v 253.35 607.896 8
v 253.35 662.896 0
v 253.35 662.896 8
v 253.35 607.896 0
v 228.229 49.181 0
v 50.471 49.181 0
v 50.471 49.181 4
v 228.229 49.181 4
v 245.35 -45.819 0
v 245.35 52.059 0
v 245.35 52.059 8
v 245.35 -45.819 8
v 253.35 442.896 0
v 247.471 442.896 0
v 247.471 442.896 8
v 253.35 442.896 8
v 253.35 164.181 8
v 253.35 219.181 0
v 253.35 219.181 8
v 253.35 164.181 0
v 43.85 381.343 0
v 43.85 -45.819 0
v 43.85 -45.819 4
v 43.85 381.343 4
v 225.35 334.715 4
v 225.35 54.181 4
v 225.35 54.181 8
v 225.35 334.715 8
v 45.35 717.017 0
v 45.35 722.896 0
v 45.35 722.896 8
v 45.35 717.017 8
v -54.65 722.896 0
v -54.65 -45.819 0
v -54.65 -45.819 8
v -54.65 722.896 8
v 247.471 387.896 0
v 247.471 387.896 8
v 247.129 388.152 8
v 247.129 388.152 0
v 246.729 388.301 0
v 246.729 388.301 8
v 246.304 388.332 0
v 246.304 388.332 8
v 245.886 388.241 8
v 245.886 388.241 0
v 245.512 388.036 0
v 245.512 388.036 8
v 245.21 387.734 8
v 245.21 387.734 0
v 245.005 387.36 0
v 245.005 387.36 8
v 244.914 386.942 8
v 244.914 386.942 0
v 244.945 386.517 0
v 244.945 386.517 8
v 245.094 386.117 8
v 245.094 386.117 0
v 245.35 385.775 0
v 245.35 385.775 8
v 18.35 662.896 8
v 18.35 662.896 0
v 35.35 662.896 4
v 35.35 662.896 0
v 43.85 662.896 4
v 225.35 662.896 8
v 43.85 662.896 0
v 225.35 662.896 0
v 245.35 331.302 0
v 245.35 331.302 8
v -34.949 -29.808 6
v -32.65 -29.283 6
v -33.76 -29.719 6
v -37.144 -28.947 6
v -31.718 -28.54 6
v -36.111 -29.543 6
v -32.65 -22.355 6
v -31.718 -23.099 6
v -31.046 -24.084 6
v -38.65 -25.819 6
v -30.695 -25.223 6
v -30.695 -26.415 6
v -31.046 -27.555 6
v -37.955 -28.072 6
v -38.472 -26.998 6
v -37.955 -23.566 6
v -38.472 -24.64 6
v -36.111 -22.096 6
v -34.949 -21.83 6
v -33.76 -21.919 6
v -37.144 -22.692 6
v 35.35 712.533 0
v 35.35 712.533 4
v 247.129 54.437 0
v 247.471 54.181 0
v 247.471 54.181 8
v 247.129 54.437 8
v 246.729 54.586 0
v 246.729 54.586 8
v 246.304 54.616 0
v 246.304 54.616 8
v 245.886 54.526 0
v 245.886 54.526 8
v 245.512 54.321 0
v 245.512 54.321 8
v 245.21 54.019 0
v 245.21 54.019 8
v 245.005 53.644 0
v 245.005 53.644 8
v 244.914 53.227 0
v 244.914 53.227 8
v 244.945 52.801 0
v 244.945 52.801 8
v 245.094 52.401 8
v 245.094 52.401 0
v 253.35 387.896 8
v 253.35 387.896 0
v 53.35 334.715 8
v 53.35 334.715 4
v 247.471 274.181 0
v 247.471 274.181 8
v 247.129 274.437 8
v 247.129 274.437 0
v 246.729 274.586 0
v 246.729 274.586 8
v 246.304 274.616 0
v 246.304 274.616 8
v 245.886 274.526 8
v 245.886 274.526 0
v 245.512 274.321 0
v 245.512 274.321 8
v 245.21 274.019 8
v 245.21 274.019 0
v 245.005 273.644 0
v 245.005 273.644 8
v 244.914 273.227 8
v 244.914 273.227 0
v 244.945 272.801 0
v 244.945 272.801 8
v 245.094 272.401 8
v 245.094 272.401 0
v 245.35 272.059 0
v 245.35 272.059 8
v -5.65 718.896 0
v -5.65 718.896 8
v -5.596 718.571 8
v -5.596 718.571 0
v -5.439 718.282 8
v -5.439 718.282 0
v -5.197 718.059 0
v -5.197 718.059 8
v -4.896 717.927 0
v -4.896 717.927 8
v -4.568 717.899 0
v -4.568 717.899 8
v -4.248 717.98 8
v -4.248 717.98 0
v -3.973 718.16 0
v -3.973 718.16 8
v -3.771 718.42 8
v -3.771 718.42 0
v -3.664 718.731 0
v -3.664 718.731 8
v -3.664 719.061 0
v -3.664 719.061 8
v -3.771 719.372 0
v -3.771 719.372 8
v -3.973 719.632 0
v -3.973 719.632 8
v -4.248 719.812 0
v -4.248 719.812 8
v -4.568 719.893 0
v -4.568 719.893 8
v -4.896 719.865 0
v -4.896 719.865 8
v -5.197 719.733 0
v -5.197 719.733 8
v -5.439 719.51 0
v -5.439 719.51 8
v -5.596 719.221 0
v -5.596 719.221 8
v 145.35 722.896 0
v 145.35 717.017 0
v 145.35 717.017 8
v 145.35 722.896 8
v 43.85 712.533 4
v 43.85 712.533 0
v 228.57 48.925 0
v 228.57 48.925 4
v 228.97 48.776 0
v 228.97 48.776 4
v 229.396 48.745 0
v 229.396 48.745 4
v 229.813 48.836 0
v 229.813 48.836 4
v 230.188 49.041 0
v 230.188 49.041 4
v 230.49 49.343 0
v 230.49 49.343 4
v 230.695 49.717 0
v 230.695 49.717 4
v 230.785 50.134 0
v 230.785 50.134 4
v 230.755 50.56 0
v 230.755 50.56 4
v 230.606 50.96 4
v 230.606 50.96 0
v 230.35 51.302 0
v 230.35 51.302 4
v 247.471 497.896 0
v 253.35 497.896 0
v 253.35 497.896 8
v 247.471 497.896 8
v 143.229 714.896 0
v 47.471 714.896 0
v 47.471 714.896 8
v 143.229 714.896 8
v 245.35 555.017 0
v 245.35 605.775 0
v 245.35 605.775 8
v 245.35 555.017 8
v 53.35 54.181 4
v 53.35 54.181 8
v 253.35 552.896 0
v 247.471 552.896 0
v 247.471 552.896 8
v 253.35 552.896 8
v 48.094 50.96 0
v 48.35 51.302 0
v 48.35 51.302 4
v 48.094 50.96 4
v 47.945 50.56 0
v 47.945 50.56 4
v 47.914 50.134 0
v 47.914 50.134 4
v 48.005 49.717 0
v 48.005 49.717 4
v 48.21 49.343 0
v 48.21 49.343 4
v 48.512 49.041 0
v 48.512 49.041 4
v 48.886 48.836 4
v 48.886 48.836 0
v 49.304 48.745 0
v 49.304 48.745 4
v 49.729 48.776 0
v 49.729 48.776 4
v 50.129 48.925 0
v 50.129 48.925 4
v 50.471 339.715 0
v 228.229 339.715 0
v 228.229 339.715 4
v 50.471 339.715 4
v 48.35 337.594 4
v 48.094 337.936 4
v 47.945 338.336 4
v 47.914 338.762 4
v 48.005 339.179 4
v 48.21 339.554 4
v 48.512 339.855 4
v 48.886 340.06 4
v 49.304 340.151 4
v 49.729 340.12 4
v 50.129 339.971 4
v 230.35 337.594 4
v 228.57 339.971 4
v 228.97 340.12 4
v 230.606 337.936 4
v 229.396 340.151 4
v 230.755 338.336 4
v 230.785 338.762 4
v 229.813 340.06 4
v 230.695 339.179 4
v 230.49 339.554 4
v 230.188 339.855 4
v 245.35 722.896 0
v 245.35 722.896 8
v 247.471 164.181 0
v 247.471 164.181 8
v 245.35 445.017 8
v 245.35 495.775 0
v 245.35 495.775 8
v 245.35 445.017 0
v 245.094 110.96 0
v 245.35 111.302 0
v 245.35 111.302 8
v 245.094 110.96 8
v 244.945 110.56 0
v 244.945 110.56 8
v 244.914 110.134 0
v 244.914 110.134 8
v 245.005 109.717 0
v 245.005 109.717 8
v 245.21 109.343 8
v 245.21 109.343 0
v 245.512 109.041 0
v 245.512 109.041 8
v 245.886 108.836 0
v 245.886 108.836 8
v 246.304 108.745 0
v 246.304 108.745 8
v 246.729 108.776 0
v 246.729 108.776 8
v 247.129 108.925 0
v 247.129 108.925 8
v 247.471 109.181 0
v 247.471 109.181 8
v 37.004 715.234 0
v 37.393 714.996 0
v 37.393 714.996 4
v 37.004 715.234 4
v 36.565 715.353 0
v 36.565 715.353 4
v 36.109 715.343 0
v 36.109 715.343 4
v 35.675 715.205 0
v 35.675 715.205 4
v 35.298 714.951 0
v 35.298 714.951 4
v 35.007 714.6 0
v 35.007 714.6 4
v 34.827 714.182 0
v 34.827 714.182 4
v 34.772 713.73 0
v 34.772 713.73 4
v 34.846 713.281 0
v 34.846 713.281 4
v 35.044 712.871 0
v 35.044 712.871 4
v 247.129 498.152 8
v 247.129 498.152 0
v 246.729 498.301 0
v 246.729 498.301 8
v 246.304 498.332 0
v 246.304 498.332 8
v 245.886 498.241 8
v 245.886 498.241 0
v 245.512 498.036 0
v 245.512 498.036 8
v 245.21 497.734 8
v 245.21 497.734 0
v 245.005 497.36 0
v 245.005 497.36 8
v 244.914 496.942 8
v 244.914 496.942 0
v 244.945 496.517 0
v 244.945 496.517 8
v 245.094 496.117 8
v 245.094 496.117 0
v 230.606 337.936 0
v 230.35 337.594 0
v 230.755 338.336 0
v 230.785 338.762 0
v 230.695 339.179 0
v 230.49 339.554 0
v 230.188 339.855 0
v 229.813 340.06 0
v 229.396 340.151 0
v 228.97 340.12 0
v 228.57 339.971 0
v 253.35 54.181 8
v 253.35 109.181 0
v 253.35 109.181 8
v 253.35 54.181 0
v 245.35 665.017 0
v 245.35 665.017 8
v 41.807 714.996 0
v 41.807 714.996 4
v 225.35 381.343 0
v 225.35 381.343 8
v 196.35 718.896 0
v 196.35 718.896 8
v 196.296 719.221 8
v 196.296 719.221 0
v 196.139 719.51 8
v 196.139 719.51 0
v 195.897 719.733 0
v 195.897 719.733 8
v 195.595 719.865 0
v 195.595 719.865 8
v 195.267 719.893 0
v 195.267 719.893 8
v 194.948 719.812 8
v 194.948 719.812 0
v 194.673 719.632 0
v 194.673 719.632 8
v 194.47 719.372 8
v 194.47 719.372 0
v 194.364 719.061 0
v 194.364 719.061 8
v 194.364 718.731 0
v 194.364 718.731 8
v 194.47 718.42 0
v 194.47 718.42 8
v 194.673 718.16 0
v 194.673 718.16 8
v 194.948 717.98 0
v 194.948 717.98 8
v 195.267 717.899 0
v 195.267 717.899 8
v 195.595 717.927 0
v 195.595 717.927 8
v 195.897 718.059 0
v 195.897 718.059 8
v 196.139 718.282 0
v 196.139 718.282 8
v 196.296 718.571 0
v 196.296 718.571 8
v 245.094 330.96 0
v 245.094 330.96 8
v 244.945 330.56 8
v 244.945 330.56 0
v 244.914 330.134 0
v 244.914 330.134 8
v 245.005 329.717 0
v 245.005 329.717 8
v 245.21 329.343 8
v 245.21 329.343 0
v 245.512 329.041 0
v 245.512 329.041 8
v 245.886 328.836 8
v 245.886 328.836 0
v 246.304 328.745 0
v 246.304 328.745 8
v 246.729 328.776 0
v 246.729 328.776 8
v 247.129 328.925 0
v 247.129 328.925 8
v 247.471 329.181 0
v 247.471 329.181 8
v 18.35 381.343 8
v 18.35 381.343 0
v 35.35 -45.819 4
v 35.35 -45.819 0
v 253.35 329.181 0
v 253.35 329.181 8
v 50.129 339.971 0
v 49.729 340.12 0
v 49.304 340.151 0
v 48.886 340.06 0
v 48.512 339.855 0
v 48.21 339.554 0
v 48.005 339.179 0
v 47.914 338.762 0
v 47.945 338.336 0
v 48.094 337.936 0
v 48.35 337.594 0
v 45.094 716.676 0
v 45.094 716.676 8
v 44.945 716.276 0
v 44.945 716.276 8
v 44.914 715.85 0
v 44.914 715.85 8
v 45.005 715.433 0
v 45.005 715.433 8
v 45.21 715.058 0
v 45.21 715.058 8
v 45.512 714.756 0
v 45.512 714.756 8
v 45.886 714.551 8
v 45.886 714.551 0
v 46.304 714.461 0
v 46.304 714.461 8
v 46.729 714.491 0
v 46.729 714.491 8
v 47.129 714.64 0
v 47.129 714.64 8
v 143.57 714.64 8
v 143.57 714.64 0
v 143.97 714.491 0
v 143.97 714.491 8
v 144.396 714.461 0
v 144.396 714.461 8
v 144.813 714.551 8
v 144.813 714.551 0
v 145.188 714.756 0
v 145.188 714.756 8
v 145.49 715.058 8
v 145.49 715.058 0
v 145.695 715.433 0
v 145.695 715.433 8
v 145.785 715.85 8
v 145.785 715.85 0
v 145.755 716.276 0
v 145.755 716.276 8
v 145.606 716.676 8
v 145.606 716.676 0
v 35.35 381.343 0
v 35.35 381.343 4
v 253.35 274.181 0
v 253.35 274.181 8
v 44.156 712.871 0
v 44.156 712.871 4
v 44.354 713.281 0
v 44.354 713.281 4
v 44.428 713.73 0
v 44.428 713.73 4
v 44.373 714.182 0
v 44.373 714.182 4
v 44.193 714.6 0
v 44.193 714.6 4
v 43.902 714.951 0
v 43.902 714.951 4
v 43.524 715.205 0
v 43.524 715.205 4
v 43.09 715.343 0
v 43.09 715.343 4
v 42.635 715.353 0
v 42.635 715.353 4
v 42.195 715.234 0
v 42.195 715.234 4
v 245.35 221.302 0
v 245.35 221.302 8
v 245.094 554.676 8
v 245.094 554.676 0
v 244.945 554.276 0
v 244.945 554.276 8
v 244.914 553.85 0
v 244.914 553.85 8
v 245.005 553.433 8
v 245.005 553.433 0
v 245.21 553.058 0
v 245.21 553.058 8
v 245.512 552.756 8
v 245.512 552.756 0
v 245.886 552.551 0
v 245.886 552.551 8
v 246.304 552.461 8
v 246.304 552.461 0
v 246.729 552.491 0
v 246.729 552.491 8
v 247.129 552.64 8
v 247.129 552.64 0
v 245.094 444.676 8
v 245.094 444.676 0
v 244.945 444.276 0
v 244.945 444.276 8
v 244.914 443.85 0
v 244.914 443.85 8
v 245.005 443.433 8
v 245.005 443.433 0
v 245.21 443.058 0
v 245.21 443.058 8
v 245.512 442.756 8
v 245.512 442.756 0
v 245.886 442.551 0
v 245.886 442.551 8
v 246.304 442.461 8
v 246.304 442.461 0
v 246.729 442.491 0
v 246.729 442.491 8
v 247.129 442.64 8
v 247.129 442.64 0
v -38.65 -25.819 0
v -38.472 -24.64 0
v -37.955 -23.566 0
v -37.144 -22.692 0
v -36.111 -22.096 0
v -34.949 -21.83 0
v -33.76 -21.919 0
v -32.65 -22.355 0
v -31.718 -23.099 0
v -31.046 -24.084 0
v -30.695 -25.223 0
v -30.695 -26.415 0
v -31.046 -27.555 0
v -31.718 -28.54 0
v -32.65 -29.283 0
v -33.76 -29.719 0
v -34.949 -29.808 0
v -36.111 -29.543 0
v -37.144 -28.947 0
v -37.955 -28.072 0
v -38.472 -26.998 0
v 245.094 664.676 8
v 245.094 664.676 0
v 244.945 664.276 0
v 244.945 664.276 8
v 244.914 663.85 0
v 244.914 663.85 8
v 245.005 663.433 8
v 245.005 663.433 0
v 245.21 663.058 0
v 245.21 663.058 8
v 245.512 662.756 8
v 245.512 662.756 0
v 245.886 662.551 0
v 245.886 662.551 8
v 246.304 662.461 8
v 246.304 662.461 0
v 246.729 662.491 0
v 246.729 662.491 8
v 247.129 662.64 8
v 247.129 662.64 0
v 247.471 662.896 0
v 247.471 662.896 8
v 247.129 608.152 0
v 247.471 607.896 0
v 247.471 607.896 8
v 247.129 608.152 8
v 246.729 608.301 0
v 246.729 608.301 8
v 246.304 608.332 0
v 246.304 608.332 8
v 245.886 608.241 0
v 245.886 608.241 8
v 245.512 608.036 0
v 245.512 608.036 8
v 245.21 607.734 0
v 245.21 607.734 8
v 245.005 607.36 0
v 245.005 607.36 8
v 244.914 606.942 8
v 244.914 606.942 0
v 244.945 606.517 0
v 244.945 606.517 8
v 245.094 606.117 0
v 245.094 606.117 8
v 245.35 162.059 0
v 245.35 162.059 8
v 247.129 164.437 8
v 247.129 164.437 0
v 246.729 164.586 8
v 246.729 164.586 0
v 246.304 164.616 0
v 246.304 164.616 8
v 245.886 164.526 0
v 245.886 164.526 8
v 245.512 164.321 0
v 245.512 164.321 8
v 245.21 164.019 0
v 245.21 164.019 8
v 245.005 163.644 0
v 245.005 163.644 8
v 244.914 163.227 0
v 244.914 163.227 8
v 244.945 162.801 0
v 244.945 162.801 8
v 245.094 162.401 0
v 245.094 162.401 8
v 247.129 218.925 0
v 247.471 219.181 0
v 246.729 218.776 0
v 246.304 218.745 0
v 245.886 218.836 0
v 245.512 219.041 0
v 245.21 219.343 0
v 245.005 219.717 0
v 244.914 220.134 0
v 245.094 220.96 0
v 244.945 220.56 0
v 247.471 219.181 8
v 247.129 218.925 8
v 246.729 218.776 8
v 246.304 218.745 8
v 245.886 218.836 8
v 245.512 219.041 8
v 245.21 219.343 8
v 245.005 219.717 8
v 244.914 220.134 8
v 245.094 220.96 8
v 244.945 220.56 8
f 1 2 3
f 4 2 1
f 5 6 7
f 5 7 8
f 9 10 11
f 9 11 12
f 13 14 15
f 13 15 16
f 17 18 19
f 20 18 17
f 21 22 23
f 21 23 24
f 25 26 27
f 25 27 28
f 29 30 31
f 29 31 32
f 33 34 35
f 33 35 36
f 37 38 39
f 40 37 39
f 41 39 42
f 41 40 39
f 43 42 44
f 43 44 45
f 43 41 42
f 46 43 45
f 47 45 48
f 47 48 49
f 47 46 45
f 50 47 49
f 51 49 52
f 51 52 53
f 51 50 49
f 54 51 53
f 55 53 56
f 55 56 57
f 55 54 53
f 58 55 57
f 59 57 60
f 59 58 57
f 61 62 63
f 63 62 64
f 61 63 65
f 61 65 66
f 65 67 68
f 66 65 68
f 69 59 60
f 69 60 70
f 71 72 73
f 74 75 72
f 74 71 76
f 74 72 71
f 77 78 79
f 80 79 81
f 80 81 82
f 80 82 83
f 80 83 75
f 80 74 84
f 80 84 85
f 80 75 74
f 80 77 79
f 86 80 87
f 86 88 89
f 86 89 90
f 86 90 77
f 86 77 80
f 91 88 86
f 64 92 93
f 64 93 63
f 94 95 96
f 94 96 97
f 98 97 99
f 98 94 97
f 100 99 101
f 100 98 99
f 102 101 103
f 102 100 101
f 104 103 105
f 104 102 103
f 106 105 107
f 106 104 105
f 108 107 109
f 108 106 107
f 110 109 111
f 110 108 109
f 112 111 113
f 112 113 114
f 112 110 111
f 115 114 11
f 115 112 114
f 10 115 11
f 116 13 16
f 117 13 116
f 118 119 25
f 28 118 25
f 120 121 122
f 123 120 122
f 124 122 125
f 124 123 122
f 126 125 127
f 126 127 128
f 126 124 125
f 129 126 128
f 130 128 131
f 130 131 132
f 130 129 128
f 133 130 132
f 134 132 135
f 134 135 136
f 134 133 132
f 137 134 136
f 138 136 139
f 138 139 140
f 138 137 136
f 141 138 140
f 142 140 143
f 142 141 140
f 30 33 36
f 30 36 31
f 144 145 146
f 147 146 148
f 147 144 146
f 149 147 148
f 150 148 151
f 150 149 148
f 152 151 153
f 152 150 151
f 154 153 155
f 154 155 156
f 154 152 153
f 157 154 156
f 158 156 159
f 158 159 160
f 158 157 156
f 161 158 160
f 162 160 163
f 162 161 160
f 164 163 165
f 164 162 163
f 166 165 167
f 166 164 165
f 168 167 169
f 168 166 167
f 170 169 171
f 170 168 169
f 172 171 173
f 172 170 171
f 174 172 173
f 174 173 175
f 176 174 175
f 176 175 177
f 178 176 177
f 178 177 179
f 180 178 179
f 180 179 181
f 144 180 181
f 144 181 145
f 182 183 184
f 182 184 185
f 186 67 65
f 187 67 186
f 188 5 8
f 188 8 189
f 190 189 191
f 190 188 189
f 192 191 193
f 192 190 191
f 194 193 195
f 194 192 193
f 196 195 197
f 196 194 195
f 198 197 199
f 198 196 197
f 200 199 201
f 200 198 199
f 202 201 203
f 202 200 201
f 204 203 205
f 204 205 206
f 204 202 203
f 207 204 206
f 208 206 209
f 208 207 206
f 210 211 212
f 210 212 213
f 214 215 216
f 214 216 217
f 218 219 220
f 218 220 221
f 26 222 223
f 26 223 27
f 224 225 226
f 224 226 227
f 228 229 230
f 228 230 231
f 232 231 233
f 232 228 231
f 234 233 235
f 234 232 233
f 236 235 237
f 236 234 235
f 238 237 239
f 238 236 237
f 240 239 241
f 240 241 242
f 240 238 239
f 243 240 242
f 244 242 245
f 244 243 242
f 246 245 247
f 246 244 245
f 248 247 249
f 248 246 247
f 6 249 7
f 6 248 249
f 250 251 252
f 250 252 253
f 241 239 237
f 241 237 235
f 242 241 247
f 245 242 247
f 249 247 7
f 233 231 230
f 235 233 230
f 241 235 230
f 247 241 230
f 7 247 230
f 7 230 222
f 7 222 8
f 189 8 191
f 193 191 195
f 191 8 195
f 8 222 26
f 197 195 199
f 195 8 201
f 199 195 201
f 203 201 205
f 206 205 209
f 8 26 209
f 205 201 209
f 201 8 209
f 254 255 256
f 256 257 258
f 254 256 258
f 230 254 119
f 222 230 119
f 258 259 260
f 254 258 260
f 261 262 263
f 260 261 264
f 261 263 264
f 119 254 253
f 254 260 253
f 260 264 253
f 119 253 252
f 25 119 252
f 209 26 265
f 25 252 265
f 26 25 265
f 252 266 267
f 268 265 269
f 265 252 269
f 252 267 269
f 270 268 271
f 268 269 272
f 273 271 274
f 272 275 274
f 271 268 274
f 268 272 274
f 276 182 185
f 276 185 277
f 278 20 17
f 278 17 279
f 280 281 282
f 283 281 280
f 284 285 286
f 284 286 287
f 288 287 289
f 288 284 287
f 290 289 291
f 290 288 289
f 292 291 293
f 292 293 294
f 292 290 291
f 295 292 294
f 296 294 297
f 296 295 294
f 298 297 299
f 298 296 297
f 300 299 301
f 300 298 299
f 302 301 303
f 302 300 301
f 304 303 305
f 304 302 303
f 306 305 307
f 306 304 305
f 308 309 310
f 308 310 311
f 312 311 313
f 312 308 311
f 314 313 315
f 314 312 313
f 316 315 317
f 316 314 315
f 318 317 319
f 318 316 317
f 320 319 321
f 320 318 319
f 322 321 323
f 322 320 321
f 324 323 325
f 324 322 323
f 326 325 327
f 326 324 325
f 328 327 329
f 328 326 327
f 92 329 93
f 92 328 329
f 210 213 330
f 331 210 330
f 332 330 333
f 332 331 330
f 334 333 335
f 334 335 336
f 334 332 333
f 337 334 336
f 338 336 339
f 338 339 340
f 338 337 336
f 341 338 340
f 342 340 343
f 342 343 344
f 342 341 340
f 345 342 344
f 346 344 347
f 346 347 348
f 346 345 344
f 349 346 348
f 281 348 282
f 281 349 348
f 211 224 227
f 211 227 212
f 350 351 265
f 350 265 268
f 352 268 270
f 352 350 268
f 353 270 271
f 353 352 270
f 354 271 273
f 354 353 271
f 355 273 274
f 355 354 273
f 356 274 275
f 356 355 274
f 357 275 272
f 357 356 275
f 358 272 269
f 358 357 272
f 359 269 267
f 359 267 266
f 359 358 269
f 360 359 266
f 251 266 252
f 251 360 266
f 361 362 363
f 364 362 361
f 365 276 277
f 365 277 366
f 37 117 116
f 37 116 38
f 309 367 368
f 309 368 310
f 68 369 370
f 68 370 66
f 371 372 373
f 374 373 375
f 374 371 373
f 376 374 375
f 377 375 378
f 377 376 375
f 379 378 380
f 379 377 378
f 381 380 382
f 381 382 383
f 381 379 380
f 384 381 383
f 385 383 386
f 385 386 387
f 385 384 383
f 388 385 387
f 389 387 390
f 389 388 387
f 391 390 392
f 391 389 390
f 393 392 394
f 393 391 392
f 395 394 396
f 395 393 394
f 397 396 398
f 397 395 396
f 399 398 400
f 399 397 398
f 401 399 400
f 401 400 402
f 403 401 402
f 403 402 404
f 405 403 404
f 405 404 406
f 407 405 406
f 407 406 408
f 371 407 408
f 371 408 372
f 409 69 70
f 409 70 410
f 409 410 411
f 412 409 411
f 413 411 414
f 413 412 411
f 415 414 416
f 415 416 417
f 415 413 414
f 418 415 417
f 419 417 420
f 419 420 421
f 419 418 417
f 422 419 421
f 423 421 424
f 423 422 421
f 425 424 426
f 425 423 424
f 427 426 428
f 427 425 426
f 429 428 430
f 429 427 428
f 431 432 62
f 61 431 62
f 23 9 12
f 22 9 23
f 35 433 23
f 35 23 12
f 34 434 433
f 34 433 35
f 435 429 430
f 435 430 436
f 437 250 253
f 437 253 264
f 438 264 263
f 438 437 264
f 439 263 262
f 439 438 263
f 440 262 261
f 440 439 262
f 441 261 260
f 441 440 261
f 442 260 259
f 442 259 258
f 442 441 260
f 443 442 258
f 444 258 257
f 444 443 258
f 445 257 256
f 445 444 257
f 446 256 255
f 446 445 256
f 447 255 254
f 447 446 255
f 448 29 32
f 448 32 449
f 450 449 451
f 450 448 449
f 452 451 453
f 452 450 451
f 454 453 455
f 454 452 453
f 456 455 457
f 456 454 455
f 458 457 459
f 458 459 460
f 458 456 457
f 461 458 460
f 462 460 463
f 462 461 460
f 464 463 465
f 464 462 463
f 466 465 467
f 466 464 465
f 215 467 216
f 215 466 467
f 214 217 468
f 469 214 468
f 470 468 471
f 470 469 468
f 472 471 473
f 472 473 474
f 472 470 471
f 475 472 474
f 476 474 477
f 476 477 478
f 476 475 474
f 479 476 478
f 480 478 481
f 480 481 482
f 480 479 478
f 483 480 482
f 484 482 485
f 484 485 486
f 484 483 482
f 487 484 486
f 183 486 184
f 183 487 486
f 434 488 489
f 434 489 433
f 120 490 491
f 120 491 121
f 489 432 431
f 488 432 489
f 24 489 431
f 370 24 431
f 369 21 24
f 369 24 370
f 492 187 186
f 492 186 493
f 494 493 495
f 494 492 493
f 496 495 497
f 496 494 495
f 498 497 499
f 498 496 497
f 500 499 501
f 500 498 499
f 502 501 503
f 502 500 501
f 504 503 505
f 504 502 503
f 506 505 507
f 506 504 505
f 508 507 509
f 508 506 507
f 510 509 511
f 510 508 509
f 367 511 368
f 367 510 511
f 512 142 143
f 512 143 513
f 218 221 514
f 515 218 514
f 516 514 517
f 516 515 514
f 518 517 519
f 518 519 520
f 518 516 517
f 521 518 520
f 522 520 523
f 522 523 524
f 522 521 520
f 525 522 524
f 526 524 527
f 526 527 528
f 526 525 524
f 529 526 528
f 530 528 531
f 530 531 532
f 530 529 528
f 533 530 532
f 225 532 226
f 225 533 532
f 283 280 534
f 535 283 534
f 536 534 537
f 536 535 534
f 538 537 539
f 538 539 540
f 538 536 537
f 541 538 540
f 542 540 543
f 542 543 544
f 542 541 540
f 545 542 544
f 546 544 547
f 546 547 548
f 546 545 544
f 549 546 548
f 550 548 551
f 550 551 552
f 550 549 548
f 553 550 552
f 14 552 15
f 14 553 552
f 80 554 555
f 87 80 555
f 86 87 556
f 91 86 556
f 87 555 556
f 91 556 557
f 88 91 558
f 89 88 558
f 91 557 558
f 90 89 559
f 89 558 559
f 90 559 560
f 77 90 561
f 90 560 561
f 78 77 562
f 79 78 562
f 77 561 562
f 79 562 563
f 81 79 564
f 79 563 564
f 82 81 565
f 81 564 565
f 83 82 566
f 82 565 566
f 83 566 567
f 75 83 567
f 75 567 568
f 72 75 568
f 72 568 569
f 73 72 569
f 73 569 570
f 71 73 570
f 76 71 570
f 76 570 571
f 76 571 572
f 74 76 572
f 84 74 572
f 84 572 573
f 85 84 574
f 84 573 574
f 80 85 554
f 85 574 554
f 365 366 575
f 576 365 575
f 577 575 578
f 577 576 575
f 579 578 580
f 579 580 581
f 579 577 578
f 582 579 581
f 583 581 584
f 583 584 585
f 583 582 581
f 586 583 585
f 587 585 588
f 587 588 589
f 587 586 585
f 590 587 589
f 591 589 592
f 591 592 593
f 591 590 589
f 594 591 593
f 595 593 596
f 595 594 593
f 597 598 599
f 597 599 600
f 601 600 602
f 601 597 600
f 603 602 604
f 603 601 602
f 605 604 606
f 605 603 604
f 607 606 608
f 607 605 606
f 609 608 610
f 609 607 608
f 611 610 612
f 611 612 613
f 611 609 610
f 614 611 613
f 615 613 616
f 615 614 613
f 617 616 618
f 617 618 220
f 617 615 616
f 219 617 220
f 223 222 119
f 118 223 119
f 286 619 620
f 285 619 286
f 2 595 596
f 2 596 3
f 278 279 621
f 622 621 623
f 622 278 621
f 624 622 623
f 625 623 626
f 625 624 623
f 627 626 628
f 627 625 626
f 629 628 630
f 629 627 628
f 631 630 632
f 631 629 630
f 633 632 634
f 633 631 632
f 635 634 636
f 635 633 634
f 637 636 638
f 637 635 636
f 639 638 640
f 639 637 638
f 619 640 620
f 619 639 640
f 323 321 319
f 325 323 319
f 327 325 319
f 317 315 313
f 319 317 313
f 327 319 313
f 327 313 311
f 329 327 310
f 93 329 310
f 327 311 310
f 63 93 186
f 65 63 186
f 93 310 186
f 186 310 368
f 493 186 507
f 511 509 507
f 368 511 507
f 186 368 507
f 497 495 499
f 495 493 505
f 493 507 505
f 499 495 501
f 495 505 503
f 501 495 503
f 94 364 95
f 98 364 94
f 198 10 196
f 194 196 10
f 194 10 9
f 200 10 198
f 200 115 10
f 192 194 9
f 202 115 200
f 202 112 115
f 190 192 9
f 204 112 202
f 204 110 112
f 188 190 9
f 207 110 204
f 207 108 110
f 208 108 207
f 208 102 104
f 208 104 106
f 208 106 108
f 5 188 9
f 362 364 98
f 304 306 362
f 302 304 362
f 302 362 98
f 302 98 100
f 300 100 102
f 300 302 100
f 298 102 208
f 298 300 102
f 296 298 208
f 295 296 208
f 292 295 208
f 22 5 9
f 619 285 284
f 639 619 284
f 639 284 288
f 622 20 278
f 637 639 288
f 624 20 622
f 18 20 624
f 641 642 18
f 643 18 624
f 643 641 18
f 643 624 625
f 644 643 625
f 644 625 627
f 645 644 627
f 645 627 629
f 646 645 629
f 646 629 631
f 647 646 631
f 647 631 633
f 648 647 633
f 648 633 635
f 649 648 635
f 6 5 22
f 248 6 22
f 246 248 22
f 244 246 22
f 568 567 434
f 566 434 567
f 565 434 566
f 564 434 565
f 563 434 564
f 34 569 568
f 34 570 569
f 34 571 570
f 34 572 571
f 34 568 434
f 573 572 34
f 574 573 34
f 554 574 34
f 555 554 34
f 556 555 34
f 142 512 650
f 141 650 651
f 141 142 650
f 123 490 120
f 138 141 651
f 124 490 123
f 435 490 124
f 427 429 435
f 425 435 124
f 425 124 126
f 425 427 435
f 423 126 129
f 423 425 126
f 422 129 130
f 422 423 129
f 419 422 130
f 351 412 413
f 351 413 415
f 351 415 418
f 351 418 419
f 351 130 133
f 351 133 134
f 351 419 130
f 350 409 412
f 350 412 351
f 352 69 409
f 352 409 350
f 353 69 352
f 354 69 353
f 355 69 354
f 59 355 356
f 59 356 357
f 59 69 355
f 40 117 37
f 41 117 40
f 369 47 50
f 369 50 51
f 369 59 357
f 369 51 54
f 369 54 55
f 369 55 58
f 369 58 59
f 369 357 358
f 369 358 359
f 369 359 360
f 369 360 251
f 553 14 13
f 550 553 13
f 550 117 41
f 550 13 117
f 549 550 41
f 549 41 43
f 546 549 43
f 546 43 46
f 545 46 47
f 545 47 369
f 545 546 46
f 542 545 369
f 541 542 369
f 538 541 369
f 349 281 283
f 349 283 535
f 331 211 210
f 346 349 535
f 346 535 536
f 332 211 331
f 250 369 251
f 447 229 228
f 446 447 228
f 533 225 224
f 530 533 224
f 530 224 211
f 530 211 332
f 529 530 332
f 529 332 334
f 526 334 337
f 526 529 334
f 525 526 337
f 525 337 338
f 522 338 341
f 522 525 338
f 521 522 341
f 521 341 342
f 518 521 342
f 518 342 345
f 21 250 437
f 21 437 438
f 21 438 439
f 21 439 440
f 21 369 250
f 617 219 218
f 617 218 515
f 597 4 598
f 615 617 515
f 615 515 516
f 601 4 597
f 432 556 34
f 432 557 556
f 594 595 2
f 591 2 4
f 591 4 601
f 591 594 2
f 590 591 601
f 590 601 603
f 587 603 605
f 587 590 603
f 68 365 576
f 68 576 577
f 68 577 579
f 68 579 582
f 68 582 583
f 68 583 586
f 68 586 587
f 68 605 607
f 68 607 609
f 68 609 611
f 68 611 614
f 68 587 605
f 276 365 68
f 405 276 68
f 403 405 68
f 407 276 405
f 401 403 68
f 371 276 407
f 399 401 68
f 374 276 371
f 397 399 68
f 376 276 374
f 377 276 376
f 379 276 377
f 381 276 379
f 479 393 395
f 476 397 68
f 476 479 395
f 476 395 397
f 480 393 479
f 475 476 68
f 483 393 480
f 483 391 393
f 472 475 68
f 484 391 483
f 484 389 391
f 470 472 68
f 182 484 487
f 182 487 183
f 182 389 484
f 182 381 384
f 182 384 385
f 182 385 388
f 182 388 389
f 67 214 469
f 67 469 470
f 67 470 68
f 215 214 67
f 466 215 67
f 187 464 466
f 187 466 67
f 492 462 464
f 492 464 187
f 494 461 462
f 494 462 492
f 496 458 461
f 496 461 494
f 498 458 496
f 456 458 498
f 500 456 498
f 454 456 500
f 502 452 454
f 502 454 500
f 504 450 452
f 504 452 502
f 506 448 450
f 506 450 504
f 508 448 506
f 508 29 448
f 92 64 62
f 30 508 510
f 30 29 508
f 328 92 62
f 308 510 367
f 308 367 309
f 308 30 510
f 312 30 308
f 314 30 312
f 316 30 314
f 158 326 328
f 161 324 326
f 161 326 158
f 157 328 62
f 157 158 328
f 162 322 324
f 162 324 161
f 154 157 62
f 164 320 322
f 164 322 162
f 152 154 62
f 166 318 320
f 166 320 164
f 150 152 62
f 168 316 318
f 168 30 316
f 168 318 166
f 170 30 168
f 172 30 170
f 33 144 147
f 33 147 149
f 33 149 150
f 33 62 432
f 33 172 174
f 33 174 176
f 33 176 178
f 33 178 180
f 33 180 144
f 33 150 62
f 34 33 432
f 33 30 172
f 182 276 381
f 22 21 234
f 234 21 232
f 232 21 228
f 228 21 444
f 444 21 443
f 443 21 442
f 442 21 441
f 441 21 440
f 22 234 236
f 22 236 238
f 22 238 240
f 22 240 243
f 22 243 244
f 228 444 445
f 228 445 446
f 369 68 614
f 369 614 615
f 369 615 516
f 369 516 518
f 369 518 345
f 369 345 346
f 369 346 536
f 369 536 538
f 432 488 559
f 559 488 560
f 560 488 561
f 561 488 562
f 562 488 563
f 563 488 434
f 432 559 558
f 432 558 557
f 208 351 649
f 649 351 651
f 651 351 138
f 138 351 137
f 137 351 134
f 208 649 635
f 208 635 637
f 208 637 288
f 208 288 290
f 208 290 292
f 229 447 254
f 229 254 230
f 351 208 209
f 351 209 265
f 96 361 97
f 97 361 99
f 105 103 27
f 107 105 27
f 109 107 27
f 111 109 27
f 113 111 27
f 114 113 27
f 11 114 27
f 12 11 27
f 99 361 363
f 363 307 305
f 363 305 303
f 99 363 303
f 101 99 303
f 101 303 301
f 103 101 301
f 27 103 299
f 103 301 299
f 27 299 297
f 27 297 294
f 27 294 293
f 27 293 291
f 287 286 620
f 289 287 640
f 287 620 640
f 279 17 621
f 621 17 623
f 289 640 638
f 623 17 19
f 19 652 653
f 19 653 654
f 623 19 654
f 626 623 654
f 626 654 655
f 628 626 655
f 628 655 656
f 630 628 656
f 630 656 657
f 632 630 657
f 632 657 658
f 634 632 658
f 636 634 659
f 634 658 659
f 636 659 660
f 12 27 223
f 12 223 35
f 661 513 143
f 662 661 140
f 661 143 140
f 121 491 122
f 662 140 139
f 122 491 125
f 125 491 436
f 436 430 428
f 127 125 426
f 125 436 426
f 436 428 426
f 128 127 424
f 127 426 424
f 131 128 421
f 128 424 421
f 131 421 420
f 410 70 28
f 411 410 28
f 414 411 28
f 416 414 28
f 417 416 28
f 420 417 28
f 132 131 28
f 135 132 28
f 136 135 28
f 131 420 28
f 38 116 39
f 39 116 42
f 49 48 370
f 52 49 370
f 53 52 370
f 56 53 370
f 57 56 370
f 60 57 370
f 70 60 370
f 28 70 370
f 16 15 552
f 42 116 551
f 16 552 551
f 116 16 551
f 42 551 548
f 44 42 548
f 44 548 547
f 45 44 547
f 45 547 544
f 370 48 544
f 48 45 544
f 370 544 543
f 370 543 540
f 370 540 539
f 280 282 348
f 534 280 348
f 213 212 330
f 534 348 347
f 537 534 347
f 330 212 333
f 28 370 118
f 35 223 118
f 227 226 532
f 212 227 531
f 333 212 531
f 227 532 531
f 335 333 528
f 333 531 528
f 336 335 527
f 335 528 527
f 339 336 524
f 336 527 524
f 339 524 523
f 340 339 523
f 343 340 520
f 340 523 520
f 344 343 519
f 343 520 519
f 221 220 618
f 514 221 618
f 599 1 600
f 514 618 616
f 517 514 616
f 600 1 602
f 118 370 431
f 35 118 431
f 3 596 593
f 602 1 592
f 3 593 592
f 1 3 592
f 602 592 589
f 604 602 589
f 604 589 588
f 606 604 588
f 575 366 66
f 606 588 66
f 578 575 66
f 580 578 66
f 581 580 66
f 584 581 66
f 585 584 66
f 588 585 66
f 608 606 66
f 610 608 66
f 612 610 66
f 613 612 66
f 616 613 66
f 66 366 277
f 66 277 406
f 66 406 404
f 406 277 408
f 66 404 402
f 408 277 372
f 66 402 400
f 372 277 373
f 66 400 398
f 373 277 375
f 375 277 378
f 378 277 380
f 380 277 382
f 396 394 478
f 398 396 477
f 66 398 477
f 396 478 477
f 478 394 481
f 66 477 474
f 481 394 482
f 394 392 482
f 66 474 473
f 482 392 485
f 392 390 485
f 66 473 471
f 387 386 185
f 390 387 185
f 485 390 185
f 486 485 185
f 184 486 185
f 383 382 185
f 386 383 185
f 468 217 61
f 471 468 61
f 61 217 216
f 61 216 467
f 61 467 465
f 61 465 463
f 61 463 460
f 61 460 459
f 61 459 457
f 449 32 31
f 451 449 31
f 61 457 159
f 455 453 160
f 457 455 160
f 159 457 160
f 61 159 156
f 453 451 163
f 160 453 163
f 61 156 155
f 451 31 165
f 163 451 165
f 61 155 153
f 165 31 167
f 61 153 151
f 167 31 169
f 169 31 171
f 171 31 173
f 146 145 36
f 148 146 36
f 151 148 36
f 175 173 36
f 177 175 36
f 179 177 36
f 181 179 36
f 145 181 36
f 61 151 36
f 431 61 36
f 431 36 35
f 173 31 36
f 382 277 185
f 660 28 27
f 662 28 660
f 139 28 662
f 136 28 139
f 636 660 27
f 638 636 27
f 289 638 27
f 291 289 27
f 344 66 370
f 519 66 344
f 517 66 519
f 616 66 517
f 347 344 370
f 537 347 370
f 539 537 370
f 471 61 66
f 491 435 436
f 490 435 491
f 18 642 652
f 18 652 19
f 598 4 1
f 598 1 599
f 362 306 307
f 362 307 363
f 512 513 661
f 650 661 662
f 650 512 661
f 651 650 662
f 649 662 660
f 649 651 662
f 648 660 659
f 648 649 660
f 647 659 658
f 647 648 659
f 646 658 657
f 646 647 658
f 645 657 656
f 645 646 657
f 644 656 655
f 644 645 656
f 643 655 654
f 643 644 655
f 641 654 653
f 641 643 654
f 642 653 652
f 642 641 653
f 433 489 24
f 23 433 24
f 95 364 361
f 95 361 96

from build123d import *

# Parameters (mm, degrees)
ESQUISSE1_R             = 1
ESQUISSE1_W             = 207
ESQUISSE1_H             = 281.553390594
ESQUISSE1_W_2           = 172
ESQUISSE1_H_2           = 280.534461641
BOSS_EXTRU_1_DEPTH      = 8
ENL_V_MAT_EXTRU_2_DEPTH = 4
ENL_V_MAT_EXTRU_3_DEPTH = 4
ESQUISSE6_R             = 4
ENL_V_MAT_EXTRU_4_DEPTH = 6


with BuildPart() as part:
    # Esquisse1 → Boss.-Extru.1 (new body)
    with BuildSketch(Plane.XY):
        with BuildLine():
            Line((-54.650090097, -45.819197646), (-54.650090097, 358.028972494))
            Line((-54.650090097, 358.028972494), (-54.650090097, 722.896071587))
            Line((-54.650090097, 722.896071587), (45.349909903, 722.896071587))
            Line((45.349909903, 722.896071587), (45.349909903, 717.01739193))
            ThreePointArc((45.349909903, 717.01739193), (45.349909903, 714.896071587), (47.471230246, 714.896071587))
            Line((47.471230246, 714.896071587), (143.228589559, 714.896071587))
            ThreePointArc((143.228589559, 714.896071587), (145.349909903, 714.896071587), (145.349909903, 717.01739193))
            Line((145.349909903, 717.01739193), (145.349909903, 722.896071587))
            Line((145.349909903, 722.896071587), (245.349909903, 722.896071587))
            Line((245.349909903, 722.896071587), (245.349909903, 665.01739193))
            ThreePointArc((245.349909903, 665.01739193), (245.349909903, 662.896071587), (247.471230246, 662.896071587))
            Line((247.471230246, 662.896071587), (253.349909903, 662.896071587))
            Line((253.349909903, 662.896071587), (253.349909903, 607.896071587))
            Line((253.349909903, 607.896071587), (247.471230246, 607.896071587))
            ThreePointArc((247.471230246, 607.896071587), (245.349909903, 607.896071587), (245.349909903, 605.774751243))
            Line((245.349909903, 605.774751243), (245.349909903, 555.01739193))
            ThreePointArc((245.349909903, 555.01739193), (245.349909903, 552.896071587), (247.471230246, 552.896071587))
            Line((247.471230246, 552.896071587), (253.349909903, 552.896071587))
            Line((253.349909903, 552.896071587), (253.349909903, 497.896071587))
            Line((253.349909903, 497.896071587), (247.471230246, 497.896071587))
            ThreePointArc((247.471230246, 497.896071587), (245.349909903, 497.896071587), (245.349909903, 495.774751243))
            Line((245.349909903, 495.774751243), (245.349909903, 445.01739193))
            ThreePointArc((245.349909903, 445.01739193), (245.349909903, 442.896071587), (247.471230246, 442.896071587))
            Line((247.471230246, 442.896071587), (253.349909903, 442.896071587))
            Line((253.349909903, 442.896071587), (253.349909903, 387.896071587))
            Line((253.349909903, 387.896071587), (247.471230246, 387.896071587))
            ThreePointArc((247.471230246, 387.896071587), (245.349909903, 387.896071587), (245.349909903, 385.774751243))
            Line((245.349909903, 385.774751243), (245.349909903, 331.302122698))
            ThreePointArc((245.349909903, 331.302122698), (245.349909903, 329.180802354), (247.471230246, 329.180802354))
            Line((247.471230246, 329.180802354), (253.349909903, 329.180802354))
            Line((253.349909903, 329.180802354), (253.349909903, 274.180802354))
            Line((253.349909903, 274.180802354), (247.471230246, 274.180802354))
            ThreePointArc((247.471230246, 274.180802354), (245.349909903, 274.180802354), (245.349909903, 272.059482011))
            Line((245.349909903, 272.059482011), (245.349909903, 221.302122698))
            ThreePointArc((245.349909903, 221.302122698), (245.349909903, 219.180802354), (247.471230246, 219.180802354))
            Line((247.471230246, 219.180802354), (253.349909903, 219.180802354))
            Line((253.349909903, 219.180802354), (253.349909903, 164.180802354))
            Line((253.349909903, 164.180802354), (247.471230246, 164.180802354))
            ThreePointArc((247.471230246, 164.180802354), (245.349909903, 164.180802354), (245.349909903, 162.059482011))
            Line((245.349909903, 162.059482011), (245.349909903, 111.302122698))
            ThreePointArc((245.349909903, 111.302122698), (245.349909903, 109.180802354), (247.471230246, 109.180802354))
            Line((247.471230246, 109.180802354), (253.349909903, 109.180802354))
            Line((253.349909903, 109.180802354), (253.349909903, 54.180802354))
            Line((253.349909903, 54.180802354), (247.471230246, 54.180802354))
            ThreePointArc((247.471230246, 54.180802354), (245.349909903, 54.180802354), (245.349909903, 52.059482011))
            Line((245.349909903, 52.059482011), (245.349909903, -45.819197646))
            Line((245.349909903, -45.819197646), (-54.650090097, -45.819197646))
        make_face()
        with Locations((195.349909903, 718.896071587)):
            Circle(ESQUISSE1_R, mode=Mode.SUBTRACT)
        with Locations(Location((-4.650090097, 718.896071587, 0), (0, 0, 180))):
            Circle(ESQUISSE1_R, mode=Mode.SUBTRACT)
        with Locations((121.849909903, 522.11937629)):
            Rectangle(ESQUISSE1_W, ESQUISSE1_H, mode=Mode.SUBTRACT)
        with Locations((139.349909903, 194.448033175)):
            Rectangle(ESQUISSE1_W_2, ESQUISSE1_H_2, mode=Mode.SUBTRACT)
    extrude(amount=BOSS_EXTRU_1_DEPTH)

    # Esquisse3 → Enlèv. mat.-Extru.2 (cut)
    with BuildSketch(Plane(origin=(0, 0, 0), x_dir=(-1, 0, 0), z_dir=(0, 0, -1))):
        with BuildLine():
            Line((-228.228589559, 339.715263995), (-50.471230246, 339.715263995))
            ThreePointArc((-50.471230246, 339.715263995), (-48.349909903, 339.715263995), (-48.349909903, 337.593943652))
            Line((-48.349909903, 337.593943652), (-48.349909903, 51.302122698))
            ThreePointArc((-48.349909903, 51.302122698), (-48.349909903, 49.180802354), (-50.471230246, 49.180802354))
            Line((-50.471230246, 49.180802354), (-228.228589559, 49.180802354))
            ThreePointArc((-228.228589559, 49.180802354), (-230.349909903, 49.180802354), (-230.349909903, 51.302122698))
            Line((-230.349909903, 51.302122698), (-230.349909903, 337.593943652))
            ThreePointArc((-230.349909903, 337.593943652), (-230.349909903, 339.715263995), (-228.228589559, 339.715263995))
        make_face()
    extrude(amount=-ENL_V_MAT_EXTRU_2_DEPTH, mode=Mode.SUBTRACT)

    # Esquisse5 → Enlèv. mat.-Extru.3 (cut)
    with BuildSketch(Plane(origin=(0, 0, 0), x_dir=(-1, 0, 0), z_dir=(0, 0, -1))):
        with BuildLine():
            Line((-35.349909903, -45.819197646), (-43.849909903, -45.819197646))
            Line((-43.849909903, -45.819197646), (-43.849909903, 712.532944954))
            ThreePointArc((-43.849909903, 712.532944954), (-44.060076233, 714.785905254), (-41.807115933, 714.996071584))
            Line((-41.807115933, 714.996071584), (-37.392703873, 714.996071584))
            ThreePointArc((-37.392703873, 714.996071584), (-35.139743573, 714.785905254), (-35.349909903, 712.532944954))
            Line((-35.349909903, 712.532944954), (-35.349909903, -45.819197646))
        make_face()
    extrude(amount=-ENL_V_MAT_EXTRU_3_DEPTH, mode=Mode.SUBTRACT)

    # Esquisse6 → Enlèv. mat.-Extru.4 (cut)
    with BuildSketch(Plane(origin=(0, 0, 0), x_dir=(-1, 0, 0), z_dir=(0, 0, -1))):
        with Locations((34.650090097, -25.819197646)):
            Circle(ESQUISSE6_R)
    extrude(amount=-ENL_V_MAT_EXTRU_4_DEPTH, mode=Mode.SUBTRACT)


solid = part.part
